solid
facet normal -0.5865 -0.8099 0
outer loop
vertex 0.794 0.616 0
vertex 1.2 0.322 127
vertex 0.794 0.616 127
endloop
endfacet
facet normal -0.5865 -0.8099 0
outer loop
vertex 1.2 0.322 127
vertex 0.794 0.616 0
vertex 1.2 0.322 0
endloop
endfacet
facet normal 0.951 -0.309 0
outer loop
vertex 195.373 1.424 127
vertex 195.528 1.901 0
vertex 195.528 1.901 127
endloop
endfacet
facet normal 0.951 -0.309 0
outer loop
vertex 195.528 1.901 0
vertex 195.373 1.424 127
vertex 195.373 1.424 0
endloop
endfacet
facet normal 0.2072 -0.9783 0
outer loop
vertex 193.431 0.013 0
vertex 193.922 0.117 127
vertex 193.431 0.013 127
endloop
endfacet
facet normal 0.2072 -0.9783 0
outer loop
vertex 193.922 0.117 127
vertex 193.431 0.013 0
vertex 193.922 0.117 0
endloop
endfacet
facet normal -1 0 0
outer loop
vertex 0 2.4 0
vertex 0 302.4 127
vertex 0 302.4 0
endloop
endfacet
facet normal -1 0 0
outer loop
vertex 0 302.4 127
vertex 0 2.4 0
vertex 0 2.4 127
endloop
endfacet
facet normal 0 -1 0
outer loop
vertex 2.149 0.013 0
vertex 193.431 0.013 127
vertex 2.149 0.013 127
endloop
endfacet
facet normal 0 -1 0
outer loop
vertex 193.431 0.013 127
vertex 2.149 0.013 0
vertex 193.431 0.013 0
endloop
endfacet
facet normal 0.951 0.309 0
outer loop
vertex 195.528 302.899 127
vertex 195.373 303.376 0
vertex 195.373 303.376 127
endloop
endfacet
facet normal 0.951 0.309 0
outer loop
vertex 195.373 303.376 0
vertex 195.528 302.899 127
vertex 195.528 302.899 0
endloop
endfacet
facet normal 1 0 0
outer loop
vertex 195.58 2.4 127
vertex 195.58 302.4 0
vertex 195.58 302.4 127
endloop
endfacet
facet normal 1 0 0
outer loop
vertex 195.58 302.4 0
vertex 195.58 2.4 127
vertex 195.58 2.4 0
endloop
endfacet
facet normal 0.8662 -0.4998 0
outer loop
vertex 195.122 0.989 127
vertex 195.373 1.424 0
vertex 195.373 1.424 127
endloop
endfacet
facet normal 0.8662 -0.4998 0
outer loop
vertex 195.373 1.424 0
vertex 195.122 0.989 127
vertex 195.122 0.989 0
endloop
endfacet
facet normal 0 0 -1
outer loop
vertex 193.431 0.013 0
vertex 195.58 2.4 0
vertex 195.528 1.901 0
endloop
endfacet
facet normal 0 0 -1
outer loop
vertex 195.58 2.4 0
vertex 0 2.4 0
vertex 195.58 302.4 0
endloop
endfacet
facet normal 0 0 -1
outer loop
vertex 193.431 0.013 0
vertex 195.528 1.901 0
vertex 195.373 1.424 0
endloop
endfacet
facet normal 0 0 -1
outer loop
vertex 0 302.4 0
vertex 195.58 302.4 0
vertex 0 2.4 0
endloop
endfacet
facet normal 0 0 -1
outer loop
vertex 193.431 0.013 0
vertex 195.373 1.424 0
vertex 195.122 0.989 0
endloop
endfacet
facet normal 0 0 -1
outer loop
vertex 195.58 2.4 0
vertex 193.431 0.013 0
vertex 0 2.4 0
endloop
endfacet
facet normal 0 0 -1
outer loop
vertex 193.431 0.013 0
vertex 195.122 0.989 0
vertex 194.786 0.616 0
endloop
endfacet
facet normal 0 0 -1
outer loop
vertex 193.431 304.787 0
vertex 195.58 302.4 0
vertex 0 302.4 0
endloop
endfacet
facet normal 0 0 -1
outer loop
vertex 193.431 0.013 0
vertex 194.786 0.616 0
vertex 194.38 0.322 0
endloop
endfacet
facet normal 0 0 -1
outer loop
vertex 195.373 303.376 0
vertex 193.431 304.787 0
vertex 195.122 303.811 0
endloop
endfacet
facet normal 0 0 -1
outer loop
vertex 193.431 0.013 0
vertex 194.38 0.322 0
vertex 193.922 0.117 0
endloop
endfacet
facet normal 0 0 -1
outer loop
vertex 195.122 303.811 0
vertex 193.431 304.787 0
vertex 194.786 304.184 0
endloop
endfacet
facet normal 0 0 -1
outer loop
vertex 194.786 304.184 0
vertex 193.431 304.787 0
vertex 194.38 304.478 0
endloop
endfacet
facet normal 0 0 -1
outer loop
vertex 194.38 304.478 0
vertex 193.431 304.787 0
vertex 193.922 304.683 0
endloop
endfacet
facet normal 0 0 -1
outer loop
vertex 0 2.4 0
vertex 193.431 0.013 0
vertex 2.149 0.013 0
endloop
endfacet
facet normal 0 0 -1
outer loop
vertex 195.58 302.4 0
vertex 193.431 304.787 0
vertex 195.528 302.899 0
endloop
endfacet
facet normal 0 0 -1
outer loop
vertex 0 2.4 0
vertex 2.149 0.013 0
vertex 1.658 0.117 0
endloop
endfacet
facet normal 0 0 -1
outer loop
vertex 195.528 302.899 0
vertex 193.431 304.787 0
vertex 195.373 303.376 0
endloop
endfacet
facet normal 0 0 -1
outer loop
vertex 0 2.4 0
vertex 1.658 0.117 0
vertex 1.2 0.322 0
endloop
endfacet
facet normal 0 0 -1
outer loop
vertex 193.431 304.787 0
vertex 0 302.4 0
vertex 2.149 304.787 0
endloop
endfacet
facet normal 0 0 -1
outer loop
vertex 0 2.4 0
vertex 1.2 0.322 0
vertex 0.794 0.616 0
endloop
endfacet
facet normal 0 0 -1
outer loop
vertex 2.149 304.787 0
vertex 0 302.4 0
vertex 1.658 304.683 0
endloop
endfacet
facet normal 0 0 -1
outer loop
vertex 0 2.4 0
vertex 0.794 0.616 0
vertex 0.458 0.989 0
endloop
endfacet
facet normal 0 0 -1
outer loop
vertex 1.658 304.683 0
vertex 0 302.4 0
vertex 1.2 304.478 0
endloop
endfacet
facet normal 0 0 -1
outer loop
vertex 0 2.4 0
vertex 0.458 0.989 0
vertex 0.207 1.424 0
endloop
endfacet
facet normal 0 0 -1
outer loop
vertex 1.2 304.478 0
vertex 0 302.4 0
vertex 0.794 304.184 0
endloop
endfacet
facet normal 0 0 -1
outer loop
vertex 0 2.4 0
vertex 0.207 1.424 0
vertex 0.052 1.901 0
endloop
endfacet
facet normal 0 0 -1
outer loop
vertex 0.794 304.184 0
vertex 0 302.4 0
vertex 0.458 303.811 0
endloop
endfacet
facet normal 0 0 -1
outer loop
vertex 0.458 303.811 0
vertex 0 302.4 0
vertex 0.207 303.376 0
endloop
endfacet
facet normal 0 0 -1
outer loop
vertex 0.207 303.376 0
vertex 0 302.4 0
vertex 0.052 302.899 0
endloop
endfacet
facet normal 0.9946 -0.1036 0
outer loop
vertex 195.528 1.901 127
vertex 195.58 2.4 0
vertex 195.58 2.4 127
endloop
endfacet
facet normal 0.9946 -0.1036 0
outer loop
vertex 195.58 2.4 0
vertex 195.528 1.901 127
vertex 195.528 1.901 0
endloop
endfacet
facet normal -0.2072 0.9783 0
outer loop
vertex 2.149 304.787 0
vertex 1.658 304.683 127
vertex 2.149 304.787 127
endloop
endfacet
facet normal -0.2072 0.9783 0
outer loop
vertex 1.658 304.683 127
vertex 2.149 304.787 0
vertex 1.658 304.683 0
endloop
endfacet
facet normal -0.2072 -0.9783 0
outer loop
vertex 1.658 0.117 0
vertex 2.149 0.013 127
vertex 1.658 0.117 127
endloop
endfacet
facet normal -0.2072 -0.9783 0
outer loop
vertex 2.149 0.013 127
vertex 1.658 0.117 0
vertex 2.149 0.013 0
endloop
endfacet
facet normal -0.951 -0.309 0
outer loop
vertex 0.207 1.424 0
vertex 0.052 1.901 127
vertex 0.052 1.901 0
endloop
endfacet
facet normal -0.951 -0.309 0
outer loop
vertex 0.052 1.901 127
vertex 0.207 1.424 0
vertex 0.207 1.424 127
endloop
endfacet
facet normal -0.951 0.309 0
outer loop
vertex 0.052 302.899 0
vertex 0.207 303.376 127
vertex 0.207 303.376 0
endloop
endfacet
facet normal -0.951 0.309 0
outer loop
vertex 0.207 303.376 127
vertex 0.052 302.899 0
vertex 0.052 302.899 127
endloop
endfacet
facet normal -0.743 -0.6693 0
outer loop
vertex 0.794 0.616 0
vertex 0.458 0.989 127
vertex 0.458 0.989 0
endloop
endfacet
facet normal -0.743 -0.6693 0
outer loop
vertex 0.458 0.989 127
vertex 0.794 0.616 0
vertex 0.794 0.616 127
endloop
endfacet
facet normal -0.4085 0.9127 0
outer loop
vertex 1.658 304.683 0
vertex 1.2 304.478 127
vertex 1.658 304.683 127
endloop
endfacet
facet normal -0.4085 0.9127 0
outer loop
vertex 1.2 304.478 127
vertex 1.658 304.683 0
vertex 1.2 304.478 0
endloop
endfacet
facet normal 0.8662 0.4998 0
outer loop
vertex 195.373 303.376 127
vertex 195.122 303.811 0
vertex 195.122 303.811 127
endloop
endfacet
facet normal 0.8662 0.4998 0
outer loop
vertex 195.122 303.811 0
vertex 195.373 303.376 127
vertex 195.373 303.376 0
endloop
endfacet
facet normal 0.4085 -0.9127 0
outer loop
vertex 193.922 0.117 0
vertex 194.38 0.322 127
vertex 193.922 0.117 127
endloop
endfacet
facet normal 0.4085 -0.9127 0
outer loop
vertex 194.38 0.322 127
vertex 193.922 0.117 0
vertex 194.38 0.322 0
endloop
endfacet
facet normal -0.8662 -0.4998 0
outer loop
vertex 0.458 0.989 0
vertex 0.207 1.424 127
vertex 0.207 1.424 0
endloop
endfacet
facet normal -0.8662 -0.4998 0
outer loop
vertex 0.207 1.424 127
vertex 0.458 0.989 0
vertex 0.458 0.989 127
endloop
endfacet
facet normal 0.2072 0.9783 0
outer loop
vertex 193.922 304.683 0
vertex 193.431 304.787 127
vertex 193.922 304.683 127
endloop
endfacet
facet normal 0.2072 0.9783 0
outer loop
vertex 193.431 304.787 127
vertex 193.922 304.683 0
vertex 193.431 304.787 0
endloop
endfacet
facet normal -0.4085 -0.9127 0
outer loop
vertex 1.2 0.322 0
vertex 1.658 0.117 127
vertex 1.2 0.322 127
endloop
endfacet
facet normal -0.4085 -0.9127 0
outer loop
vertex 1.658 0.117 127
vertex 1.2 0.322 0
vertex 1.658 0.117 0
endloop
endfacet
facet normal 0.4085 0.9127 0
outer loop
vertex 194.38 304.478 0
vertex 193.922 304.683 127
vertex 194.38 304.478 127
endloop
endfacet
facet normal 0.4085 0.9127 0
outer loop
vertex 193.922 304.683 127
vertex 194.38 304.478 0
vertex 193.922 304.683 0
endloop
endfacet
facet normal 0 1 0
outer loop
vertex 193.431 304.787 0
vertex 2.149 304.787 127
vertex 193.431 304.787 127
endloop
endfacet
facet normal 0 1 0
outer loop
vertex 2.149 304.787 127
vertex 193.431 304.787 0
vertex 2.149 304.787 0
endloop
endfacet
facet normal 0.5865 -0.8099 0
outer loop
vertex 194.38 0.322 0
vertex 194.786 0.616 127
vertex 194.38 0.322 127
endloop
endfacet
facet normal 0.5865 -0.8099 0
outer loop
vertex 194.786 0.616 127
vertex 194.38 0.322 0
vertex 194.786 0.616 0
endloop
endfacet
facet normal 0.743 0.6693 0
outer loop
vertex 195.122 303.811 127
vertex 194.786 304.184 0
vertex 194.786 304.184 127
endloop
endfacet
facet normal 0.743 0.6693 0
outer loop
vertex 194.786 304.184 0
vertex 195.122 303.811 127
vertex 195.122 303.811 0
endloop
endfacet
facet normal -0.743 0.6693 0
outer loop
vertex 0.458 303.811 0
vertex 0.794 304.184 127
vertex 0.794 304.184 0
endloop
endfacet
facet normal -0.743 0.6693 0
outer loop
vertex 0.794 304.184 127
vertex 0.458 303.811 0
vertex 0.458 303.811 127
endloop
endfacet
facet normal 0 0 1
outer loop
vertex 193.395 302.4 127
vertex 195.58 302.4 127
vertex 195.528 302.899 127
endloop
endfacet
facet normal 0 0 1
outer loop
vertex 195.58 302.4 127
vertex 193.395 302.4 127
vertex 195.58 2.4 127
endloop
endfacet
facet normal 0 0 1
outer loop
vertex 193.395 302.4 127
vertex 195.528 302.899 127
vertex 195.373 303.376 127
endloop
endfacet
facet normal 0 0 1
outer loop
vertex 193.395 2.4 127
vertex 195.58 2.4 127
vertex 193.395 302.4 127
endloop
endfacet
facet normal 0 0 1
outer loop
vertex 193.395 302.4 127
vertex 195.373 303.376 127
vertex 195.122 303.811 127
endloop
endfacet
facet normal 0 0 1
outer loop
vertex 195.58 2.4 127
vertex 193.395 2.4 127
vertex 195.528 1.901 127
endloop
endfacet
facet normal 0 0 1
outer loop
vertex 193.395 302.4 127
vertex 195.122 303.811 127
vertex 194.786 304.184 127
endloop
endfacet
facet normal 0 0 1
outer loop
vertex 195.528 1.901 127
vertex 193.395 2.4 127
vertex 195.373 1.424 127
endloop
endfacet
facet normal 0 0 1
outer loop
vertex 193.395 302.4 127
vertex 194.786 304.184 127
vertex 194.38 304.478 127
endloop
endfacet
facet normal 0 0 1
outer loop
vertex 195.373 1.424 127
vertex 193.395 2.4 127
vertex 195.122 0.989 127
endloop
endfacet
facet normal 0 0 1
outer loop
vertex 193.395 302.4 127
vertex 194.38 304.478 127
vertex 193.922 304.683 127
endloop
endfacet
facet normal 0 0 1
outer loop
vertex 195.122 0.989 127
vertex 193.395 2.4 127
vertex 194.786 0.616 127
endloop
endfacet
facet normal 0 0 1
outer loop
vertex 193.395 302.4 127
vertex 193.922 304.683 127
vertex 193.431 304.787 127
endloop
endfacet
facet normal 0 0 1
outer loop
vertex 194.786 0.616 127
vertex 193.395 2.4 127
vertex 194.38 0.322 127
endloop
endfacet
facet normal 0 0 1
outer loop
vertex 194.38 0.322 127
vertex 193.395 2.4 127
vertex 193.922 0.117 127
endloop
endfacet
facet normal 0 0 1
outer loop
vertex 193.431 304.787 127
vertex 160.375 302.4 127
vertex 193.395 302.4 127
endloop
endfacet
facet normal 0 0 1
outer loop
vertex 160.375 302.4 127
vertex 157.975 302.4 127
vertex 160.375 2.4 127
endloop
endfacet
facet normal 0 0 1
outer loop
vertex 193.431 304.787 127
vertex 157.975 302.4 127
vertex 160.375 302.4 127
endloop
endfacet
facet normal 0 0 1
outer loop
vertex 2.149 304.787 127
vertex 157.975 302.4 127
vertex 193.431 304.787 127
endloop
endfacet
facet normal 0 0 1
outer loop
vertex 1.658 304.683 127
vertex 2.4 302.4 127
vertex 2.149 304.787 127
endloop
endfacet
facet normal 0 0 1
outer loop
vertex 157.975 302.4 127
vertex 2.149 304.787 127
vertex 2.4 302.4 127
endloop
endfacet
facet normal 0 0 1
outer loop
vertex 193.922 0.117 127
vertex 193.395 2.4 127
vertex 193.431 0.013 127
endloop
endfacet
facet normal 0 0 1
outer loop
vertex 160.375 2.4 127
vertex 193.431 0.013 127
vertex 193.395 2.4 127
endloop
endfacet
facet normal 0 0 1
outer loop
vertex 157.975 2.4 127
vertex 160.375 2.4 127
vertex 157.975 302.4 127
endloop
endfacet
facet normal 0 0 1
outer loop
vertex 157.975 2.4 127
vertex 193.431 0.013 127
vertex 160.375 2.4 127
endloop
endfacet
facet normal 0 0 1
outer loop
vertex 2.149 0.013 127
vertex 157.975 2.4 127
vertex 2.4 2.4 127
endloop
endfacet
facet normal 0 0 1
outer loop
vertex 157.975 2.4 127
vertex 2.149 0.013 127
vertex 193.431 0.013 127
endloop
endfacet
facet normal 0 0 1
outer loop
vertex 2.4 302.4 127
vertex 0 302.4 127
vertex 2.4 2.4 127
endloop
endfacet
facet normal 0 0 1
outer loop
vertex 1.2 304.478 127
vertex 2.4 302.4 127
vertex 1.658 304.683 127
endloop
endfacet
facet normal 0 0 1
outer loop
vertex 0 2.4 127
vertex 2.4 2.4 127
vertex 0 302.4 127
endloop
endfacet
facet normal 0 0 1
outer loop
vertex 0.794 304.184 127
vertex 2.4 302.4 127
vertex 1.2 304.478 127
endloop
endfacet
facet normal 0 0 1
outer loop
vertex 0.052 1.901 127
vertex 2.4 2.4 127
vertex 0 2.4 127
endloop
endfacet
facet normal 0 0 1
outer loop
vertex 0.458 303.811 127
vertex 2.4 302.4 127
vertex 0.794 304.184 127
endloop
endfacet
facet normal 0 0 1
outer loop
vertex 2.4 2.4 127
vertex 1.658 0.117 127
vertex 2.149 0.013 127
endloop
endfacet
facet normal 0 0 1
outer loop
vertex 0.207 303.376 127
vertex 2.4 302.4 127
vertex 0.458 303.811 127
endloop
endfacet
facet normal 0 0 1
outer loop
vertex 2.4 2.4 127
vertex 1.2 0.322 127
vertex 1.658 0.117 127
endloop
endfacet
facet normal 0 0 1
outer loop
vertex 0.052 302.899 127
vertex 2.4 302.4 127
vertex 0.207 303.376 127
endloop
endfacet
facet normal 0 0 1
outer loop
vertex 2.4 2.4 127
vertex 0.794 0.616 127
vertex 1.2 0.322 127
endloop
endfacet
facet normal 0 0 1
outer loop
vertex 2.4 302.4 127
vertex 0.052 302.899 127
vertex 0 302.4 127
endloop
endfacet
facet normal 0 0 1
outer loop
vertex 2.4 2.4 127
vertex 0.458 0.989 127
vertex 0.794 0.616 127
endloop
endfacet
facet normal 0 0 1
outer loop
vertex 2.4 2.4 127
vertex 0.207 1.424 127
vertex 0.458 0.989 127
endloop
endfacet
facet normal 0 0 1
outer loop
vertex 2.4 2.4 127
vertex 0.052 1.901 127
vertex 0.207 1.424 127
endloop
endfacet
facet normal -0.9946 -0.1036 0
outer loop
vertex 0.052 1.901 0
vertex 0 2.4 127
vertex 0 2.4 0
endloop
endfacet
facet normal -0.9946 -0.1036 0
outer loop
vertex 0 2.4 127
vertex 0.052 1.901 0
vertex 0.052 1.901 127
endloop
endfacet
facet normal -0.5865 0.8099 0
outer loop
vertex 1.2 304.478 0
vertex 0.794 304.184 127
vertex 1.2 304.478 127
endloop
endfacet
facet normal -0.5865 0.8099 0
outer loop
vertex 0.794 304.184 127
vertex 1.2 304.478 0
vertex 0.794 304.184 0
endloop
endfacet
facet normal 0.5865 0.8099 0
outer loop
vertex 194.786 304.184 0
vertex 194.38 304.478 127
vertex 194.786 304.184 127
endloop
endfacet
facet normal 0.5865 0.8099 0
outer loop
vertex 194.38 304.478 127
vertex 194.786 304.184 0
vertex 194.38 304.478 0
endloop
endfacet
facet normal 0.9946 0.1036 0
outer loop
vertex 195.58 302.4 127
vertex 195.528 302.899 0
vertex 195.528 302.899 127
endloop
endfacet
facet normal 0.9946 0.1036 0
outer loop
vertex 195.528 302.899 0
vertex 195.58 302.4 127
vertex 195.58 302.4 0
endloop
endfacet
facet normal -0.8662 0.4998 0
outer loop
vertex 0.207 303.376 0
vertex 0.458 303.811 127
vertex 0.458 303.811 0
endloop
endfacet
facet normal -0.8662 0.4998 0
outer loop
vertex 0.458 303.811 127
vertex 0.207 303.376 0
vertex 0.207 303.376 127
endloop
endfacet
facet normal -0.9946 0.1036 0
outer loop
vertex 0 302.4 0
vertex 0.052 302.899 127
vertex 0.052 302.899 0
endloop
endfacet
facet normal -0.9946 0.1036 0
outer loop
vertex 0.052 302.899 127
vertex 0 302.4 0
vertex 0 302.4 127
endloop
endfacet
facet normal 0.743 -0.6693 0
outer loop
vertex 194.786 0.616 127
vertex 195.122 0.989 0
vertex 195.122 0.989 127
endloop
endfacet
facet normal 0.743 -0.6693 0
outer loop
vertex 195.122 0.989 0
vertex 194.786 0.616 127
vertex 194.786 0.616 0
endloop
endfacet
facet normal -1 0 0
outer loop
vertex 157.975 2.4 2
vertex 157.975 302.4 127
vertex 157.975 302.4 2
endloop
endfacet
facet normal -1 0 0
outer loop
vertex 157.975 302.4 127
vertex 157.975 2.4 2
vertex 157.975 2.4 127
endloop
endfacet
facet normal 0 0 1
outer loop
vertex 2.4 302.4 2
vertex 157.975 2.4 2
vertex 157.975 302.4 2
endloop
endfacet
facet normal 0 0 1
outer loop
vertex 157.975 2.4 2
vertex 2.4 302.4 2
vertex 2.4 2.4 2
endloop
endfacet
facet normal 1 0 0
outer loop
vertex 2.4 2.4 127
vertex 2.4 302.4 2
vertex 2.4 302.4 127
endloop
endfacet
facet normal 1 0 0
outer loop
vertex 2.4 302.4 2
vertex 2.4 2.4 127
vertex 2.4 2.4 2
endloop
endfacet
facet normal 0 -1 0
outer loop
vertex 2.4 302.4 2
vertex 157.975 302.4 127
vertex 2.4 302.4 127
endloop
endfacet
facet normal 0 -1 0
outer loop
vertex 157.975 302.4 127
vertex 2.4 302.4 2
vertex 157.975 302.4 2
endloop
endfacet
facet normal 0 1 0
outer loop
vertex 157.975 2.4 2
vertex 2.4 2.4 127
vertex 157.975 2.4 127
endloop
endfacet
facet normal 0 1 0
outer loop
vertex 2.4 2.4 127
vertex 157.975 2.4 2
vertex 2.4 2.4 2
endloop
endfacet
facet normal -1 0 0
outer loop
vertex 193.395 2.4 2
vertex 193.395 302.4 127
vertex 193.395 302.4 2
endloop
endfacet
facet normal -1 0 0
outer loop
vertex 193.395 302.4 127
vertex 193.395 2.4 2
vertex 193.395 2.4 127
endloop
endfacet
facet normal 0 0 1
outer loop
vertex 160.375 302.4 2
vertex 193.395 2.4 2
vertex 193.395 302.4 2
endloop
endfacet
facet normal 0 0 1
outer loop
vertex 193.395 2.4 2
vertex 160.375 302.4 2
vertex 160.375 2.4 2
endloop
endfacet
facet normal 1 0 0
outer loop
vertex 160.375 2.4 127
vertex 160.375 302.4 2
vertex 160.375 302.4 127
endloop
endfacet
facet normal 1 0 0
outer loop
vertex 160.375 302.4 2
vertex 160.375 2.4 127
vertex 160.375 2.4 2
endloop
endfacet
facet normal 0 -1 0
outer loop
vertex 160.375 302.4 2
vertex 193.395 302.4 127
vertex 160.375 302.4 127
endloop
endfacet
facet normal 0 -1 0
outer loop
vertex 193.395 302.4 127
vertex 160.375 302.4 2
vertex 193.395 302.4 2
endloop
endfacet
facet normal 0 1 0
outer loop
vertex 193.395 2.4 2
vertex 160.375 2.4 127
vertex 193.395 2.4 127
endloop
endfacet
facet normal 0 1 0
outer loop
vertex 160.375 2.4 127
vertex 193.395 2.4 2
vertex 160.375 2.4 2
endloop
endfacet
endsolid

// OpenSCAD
$fn=30;


difference() {
   hull() {
      translate([25.4 * 7.70 -2.4, 2.4,0]) cylinder(r=2.4,h=25.4 * 5.0);
      translate([25.4 * 7.70 - 2.4, 25.4 * 12 - 2.4,0]) cylinder(r=2.4,h=25.4 * 5.0);
      translate([2.4, 2.4,0]) cylinder(r=2.4,h=25.4 * 5.0);
      translate([2.4, 25.4 * 12 - 2.4,0]) cylinder(r=2.4,h=25.4 * 5.0);
   }

   translate([2.4,2.4,2]) cube([25.4 * 6.125, 25.4 * 12 - 4.8, 25.4 * 5.5]);
   translate([25.4 * 6.125 + 2.4 + 2.4,2.4,2]) cube([25.4 * 1.3, 25.4 * 12 - 4.8, 25.4 * 5.5]);
}

if (0) hull() {
   translate([25.4 * 6.125 + 2.4, 2.4,0]) cylinder(r=2.4,h=25.4 * 5.0);
   translate([25.4 * 6.125 + 2.4, 25.4 * 12 - 2.4,0]) cylinder(r=2.4,h=25.4 * 5.0);
   translate([2.4, 2.4,0]) cylinder(r=2.4,h=25.4 * 5.0);
   translate([2.4, 25.4 * 12 - 2.4,0]) cylinder(r=2.4,h=25.4 * 5.0);
}
